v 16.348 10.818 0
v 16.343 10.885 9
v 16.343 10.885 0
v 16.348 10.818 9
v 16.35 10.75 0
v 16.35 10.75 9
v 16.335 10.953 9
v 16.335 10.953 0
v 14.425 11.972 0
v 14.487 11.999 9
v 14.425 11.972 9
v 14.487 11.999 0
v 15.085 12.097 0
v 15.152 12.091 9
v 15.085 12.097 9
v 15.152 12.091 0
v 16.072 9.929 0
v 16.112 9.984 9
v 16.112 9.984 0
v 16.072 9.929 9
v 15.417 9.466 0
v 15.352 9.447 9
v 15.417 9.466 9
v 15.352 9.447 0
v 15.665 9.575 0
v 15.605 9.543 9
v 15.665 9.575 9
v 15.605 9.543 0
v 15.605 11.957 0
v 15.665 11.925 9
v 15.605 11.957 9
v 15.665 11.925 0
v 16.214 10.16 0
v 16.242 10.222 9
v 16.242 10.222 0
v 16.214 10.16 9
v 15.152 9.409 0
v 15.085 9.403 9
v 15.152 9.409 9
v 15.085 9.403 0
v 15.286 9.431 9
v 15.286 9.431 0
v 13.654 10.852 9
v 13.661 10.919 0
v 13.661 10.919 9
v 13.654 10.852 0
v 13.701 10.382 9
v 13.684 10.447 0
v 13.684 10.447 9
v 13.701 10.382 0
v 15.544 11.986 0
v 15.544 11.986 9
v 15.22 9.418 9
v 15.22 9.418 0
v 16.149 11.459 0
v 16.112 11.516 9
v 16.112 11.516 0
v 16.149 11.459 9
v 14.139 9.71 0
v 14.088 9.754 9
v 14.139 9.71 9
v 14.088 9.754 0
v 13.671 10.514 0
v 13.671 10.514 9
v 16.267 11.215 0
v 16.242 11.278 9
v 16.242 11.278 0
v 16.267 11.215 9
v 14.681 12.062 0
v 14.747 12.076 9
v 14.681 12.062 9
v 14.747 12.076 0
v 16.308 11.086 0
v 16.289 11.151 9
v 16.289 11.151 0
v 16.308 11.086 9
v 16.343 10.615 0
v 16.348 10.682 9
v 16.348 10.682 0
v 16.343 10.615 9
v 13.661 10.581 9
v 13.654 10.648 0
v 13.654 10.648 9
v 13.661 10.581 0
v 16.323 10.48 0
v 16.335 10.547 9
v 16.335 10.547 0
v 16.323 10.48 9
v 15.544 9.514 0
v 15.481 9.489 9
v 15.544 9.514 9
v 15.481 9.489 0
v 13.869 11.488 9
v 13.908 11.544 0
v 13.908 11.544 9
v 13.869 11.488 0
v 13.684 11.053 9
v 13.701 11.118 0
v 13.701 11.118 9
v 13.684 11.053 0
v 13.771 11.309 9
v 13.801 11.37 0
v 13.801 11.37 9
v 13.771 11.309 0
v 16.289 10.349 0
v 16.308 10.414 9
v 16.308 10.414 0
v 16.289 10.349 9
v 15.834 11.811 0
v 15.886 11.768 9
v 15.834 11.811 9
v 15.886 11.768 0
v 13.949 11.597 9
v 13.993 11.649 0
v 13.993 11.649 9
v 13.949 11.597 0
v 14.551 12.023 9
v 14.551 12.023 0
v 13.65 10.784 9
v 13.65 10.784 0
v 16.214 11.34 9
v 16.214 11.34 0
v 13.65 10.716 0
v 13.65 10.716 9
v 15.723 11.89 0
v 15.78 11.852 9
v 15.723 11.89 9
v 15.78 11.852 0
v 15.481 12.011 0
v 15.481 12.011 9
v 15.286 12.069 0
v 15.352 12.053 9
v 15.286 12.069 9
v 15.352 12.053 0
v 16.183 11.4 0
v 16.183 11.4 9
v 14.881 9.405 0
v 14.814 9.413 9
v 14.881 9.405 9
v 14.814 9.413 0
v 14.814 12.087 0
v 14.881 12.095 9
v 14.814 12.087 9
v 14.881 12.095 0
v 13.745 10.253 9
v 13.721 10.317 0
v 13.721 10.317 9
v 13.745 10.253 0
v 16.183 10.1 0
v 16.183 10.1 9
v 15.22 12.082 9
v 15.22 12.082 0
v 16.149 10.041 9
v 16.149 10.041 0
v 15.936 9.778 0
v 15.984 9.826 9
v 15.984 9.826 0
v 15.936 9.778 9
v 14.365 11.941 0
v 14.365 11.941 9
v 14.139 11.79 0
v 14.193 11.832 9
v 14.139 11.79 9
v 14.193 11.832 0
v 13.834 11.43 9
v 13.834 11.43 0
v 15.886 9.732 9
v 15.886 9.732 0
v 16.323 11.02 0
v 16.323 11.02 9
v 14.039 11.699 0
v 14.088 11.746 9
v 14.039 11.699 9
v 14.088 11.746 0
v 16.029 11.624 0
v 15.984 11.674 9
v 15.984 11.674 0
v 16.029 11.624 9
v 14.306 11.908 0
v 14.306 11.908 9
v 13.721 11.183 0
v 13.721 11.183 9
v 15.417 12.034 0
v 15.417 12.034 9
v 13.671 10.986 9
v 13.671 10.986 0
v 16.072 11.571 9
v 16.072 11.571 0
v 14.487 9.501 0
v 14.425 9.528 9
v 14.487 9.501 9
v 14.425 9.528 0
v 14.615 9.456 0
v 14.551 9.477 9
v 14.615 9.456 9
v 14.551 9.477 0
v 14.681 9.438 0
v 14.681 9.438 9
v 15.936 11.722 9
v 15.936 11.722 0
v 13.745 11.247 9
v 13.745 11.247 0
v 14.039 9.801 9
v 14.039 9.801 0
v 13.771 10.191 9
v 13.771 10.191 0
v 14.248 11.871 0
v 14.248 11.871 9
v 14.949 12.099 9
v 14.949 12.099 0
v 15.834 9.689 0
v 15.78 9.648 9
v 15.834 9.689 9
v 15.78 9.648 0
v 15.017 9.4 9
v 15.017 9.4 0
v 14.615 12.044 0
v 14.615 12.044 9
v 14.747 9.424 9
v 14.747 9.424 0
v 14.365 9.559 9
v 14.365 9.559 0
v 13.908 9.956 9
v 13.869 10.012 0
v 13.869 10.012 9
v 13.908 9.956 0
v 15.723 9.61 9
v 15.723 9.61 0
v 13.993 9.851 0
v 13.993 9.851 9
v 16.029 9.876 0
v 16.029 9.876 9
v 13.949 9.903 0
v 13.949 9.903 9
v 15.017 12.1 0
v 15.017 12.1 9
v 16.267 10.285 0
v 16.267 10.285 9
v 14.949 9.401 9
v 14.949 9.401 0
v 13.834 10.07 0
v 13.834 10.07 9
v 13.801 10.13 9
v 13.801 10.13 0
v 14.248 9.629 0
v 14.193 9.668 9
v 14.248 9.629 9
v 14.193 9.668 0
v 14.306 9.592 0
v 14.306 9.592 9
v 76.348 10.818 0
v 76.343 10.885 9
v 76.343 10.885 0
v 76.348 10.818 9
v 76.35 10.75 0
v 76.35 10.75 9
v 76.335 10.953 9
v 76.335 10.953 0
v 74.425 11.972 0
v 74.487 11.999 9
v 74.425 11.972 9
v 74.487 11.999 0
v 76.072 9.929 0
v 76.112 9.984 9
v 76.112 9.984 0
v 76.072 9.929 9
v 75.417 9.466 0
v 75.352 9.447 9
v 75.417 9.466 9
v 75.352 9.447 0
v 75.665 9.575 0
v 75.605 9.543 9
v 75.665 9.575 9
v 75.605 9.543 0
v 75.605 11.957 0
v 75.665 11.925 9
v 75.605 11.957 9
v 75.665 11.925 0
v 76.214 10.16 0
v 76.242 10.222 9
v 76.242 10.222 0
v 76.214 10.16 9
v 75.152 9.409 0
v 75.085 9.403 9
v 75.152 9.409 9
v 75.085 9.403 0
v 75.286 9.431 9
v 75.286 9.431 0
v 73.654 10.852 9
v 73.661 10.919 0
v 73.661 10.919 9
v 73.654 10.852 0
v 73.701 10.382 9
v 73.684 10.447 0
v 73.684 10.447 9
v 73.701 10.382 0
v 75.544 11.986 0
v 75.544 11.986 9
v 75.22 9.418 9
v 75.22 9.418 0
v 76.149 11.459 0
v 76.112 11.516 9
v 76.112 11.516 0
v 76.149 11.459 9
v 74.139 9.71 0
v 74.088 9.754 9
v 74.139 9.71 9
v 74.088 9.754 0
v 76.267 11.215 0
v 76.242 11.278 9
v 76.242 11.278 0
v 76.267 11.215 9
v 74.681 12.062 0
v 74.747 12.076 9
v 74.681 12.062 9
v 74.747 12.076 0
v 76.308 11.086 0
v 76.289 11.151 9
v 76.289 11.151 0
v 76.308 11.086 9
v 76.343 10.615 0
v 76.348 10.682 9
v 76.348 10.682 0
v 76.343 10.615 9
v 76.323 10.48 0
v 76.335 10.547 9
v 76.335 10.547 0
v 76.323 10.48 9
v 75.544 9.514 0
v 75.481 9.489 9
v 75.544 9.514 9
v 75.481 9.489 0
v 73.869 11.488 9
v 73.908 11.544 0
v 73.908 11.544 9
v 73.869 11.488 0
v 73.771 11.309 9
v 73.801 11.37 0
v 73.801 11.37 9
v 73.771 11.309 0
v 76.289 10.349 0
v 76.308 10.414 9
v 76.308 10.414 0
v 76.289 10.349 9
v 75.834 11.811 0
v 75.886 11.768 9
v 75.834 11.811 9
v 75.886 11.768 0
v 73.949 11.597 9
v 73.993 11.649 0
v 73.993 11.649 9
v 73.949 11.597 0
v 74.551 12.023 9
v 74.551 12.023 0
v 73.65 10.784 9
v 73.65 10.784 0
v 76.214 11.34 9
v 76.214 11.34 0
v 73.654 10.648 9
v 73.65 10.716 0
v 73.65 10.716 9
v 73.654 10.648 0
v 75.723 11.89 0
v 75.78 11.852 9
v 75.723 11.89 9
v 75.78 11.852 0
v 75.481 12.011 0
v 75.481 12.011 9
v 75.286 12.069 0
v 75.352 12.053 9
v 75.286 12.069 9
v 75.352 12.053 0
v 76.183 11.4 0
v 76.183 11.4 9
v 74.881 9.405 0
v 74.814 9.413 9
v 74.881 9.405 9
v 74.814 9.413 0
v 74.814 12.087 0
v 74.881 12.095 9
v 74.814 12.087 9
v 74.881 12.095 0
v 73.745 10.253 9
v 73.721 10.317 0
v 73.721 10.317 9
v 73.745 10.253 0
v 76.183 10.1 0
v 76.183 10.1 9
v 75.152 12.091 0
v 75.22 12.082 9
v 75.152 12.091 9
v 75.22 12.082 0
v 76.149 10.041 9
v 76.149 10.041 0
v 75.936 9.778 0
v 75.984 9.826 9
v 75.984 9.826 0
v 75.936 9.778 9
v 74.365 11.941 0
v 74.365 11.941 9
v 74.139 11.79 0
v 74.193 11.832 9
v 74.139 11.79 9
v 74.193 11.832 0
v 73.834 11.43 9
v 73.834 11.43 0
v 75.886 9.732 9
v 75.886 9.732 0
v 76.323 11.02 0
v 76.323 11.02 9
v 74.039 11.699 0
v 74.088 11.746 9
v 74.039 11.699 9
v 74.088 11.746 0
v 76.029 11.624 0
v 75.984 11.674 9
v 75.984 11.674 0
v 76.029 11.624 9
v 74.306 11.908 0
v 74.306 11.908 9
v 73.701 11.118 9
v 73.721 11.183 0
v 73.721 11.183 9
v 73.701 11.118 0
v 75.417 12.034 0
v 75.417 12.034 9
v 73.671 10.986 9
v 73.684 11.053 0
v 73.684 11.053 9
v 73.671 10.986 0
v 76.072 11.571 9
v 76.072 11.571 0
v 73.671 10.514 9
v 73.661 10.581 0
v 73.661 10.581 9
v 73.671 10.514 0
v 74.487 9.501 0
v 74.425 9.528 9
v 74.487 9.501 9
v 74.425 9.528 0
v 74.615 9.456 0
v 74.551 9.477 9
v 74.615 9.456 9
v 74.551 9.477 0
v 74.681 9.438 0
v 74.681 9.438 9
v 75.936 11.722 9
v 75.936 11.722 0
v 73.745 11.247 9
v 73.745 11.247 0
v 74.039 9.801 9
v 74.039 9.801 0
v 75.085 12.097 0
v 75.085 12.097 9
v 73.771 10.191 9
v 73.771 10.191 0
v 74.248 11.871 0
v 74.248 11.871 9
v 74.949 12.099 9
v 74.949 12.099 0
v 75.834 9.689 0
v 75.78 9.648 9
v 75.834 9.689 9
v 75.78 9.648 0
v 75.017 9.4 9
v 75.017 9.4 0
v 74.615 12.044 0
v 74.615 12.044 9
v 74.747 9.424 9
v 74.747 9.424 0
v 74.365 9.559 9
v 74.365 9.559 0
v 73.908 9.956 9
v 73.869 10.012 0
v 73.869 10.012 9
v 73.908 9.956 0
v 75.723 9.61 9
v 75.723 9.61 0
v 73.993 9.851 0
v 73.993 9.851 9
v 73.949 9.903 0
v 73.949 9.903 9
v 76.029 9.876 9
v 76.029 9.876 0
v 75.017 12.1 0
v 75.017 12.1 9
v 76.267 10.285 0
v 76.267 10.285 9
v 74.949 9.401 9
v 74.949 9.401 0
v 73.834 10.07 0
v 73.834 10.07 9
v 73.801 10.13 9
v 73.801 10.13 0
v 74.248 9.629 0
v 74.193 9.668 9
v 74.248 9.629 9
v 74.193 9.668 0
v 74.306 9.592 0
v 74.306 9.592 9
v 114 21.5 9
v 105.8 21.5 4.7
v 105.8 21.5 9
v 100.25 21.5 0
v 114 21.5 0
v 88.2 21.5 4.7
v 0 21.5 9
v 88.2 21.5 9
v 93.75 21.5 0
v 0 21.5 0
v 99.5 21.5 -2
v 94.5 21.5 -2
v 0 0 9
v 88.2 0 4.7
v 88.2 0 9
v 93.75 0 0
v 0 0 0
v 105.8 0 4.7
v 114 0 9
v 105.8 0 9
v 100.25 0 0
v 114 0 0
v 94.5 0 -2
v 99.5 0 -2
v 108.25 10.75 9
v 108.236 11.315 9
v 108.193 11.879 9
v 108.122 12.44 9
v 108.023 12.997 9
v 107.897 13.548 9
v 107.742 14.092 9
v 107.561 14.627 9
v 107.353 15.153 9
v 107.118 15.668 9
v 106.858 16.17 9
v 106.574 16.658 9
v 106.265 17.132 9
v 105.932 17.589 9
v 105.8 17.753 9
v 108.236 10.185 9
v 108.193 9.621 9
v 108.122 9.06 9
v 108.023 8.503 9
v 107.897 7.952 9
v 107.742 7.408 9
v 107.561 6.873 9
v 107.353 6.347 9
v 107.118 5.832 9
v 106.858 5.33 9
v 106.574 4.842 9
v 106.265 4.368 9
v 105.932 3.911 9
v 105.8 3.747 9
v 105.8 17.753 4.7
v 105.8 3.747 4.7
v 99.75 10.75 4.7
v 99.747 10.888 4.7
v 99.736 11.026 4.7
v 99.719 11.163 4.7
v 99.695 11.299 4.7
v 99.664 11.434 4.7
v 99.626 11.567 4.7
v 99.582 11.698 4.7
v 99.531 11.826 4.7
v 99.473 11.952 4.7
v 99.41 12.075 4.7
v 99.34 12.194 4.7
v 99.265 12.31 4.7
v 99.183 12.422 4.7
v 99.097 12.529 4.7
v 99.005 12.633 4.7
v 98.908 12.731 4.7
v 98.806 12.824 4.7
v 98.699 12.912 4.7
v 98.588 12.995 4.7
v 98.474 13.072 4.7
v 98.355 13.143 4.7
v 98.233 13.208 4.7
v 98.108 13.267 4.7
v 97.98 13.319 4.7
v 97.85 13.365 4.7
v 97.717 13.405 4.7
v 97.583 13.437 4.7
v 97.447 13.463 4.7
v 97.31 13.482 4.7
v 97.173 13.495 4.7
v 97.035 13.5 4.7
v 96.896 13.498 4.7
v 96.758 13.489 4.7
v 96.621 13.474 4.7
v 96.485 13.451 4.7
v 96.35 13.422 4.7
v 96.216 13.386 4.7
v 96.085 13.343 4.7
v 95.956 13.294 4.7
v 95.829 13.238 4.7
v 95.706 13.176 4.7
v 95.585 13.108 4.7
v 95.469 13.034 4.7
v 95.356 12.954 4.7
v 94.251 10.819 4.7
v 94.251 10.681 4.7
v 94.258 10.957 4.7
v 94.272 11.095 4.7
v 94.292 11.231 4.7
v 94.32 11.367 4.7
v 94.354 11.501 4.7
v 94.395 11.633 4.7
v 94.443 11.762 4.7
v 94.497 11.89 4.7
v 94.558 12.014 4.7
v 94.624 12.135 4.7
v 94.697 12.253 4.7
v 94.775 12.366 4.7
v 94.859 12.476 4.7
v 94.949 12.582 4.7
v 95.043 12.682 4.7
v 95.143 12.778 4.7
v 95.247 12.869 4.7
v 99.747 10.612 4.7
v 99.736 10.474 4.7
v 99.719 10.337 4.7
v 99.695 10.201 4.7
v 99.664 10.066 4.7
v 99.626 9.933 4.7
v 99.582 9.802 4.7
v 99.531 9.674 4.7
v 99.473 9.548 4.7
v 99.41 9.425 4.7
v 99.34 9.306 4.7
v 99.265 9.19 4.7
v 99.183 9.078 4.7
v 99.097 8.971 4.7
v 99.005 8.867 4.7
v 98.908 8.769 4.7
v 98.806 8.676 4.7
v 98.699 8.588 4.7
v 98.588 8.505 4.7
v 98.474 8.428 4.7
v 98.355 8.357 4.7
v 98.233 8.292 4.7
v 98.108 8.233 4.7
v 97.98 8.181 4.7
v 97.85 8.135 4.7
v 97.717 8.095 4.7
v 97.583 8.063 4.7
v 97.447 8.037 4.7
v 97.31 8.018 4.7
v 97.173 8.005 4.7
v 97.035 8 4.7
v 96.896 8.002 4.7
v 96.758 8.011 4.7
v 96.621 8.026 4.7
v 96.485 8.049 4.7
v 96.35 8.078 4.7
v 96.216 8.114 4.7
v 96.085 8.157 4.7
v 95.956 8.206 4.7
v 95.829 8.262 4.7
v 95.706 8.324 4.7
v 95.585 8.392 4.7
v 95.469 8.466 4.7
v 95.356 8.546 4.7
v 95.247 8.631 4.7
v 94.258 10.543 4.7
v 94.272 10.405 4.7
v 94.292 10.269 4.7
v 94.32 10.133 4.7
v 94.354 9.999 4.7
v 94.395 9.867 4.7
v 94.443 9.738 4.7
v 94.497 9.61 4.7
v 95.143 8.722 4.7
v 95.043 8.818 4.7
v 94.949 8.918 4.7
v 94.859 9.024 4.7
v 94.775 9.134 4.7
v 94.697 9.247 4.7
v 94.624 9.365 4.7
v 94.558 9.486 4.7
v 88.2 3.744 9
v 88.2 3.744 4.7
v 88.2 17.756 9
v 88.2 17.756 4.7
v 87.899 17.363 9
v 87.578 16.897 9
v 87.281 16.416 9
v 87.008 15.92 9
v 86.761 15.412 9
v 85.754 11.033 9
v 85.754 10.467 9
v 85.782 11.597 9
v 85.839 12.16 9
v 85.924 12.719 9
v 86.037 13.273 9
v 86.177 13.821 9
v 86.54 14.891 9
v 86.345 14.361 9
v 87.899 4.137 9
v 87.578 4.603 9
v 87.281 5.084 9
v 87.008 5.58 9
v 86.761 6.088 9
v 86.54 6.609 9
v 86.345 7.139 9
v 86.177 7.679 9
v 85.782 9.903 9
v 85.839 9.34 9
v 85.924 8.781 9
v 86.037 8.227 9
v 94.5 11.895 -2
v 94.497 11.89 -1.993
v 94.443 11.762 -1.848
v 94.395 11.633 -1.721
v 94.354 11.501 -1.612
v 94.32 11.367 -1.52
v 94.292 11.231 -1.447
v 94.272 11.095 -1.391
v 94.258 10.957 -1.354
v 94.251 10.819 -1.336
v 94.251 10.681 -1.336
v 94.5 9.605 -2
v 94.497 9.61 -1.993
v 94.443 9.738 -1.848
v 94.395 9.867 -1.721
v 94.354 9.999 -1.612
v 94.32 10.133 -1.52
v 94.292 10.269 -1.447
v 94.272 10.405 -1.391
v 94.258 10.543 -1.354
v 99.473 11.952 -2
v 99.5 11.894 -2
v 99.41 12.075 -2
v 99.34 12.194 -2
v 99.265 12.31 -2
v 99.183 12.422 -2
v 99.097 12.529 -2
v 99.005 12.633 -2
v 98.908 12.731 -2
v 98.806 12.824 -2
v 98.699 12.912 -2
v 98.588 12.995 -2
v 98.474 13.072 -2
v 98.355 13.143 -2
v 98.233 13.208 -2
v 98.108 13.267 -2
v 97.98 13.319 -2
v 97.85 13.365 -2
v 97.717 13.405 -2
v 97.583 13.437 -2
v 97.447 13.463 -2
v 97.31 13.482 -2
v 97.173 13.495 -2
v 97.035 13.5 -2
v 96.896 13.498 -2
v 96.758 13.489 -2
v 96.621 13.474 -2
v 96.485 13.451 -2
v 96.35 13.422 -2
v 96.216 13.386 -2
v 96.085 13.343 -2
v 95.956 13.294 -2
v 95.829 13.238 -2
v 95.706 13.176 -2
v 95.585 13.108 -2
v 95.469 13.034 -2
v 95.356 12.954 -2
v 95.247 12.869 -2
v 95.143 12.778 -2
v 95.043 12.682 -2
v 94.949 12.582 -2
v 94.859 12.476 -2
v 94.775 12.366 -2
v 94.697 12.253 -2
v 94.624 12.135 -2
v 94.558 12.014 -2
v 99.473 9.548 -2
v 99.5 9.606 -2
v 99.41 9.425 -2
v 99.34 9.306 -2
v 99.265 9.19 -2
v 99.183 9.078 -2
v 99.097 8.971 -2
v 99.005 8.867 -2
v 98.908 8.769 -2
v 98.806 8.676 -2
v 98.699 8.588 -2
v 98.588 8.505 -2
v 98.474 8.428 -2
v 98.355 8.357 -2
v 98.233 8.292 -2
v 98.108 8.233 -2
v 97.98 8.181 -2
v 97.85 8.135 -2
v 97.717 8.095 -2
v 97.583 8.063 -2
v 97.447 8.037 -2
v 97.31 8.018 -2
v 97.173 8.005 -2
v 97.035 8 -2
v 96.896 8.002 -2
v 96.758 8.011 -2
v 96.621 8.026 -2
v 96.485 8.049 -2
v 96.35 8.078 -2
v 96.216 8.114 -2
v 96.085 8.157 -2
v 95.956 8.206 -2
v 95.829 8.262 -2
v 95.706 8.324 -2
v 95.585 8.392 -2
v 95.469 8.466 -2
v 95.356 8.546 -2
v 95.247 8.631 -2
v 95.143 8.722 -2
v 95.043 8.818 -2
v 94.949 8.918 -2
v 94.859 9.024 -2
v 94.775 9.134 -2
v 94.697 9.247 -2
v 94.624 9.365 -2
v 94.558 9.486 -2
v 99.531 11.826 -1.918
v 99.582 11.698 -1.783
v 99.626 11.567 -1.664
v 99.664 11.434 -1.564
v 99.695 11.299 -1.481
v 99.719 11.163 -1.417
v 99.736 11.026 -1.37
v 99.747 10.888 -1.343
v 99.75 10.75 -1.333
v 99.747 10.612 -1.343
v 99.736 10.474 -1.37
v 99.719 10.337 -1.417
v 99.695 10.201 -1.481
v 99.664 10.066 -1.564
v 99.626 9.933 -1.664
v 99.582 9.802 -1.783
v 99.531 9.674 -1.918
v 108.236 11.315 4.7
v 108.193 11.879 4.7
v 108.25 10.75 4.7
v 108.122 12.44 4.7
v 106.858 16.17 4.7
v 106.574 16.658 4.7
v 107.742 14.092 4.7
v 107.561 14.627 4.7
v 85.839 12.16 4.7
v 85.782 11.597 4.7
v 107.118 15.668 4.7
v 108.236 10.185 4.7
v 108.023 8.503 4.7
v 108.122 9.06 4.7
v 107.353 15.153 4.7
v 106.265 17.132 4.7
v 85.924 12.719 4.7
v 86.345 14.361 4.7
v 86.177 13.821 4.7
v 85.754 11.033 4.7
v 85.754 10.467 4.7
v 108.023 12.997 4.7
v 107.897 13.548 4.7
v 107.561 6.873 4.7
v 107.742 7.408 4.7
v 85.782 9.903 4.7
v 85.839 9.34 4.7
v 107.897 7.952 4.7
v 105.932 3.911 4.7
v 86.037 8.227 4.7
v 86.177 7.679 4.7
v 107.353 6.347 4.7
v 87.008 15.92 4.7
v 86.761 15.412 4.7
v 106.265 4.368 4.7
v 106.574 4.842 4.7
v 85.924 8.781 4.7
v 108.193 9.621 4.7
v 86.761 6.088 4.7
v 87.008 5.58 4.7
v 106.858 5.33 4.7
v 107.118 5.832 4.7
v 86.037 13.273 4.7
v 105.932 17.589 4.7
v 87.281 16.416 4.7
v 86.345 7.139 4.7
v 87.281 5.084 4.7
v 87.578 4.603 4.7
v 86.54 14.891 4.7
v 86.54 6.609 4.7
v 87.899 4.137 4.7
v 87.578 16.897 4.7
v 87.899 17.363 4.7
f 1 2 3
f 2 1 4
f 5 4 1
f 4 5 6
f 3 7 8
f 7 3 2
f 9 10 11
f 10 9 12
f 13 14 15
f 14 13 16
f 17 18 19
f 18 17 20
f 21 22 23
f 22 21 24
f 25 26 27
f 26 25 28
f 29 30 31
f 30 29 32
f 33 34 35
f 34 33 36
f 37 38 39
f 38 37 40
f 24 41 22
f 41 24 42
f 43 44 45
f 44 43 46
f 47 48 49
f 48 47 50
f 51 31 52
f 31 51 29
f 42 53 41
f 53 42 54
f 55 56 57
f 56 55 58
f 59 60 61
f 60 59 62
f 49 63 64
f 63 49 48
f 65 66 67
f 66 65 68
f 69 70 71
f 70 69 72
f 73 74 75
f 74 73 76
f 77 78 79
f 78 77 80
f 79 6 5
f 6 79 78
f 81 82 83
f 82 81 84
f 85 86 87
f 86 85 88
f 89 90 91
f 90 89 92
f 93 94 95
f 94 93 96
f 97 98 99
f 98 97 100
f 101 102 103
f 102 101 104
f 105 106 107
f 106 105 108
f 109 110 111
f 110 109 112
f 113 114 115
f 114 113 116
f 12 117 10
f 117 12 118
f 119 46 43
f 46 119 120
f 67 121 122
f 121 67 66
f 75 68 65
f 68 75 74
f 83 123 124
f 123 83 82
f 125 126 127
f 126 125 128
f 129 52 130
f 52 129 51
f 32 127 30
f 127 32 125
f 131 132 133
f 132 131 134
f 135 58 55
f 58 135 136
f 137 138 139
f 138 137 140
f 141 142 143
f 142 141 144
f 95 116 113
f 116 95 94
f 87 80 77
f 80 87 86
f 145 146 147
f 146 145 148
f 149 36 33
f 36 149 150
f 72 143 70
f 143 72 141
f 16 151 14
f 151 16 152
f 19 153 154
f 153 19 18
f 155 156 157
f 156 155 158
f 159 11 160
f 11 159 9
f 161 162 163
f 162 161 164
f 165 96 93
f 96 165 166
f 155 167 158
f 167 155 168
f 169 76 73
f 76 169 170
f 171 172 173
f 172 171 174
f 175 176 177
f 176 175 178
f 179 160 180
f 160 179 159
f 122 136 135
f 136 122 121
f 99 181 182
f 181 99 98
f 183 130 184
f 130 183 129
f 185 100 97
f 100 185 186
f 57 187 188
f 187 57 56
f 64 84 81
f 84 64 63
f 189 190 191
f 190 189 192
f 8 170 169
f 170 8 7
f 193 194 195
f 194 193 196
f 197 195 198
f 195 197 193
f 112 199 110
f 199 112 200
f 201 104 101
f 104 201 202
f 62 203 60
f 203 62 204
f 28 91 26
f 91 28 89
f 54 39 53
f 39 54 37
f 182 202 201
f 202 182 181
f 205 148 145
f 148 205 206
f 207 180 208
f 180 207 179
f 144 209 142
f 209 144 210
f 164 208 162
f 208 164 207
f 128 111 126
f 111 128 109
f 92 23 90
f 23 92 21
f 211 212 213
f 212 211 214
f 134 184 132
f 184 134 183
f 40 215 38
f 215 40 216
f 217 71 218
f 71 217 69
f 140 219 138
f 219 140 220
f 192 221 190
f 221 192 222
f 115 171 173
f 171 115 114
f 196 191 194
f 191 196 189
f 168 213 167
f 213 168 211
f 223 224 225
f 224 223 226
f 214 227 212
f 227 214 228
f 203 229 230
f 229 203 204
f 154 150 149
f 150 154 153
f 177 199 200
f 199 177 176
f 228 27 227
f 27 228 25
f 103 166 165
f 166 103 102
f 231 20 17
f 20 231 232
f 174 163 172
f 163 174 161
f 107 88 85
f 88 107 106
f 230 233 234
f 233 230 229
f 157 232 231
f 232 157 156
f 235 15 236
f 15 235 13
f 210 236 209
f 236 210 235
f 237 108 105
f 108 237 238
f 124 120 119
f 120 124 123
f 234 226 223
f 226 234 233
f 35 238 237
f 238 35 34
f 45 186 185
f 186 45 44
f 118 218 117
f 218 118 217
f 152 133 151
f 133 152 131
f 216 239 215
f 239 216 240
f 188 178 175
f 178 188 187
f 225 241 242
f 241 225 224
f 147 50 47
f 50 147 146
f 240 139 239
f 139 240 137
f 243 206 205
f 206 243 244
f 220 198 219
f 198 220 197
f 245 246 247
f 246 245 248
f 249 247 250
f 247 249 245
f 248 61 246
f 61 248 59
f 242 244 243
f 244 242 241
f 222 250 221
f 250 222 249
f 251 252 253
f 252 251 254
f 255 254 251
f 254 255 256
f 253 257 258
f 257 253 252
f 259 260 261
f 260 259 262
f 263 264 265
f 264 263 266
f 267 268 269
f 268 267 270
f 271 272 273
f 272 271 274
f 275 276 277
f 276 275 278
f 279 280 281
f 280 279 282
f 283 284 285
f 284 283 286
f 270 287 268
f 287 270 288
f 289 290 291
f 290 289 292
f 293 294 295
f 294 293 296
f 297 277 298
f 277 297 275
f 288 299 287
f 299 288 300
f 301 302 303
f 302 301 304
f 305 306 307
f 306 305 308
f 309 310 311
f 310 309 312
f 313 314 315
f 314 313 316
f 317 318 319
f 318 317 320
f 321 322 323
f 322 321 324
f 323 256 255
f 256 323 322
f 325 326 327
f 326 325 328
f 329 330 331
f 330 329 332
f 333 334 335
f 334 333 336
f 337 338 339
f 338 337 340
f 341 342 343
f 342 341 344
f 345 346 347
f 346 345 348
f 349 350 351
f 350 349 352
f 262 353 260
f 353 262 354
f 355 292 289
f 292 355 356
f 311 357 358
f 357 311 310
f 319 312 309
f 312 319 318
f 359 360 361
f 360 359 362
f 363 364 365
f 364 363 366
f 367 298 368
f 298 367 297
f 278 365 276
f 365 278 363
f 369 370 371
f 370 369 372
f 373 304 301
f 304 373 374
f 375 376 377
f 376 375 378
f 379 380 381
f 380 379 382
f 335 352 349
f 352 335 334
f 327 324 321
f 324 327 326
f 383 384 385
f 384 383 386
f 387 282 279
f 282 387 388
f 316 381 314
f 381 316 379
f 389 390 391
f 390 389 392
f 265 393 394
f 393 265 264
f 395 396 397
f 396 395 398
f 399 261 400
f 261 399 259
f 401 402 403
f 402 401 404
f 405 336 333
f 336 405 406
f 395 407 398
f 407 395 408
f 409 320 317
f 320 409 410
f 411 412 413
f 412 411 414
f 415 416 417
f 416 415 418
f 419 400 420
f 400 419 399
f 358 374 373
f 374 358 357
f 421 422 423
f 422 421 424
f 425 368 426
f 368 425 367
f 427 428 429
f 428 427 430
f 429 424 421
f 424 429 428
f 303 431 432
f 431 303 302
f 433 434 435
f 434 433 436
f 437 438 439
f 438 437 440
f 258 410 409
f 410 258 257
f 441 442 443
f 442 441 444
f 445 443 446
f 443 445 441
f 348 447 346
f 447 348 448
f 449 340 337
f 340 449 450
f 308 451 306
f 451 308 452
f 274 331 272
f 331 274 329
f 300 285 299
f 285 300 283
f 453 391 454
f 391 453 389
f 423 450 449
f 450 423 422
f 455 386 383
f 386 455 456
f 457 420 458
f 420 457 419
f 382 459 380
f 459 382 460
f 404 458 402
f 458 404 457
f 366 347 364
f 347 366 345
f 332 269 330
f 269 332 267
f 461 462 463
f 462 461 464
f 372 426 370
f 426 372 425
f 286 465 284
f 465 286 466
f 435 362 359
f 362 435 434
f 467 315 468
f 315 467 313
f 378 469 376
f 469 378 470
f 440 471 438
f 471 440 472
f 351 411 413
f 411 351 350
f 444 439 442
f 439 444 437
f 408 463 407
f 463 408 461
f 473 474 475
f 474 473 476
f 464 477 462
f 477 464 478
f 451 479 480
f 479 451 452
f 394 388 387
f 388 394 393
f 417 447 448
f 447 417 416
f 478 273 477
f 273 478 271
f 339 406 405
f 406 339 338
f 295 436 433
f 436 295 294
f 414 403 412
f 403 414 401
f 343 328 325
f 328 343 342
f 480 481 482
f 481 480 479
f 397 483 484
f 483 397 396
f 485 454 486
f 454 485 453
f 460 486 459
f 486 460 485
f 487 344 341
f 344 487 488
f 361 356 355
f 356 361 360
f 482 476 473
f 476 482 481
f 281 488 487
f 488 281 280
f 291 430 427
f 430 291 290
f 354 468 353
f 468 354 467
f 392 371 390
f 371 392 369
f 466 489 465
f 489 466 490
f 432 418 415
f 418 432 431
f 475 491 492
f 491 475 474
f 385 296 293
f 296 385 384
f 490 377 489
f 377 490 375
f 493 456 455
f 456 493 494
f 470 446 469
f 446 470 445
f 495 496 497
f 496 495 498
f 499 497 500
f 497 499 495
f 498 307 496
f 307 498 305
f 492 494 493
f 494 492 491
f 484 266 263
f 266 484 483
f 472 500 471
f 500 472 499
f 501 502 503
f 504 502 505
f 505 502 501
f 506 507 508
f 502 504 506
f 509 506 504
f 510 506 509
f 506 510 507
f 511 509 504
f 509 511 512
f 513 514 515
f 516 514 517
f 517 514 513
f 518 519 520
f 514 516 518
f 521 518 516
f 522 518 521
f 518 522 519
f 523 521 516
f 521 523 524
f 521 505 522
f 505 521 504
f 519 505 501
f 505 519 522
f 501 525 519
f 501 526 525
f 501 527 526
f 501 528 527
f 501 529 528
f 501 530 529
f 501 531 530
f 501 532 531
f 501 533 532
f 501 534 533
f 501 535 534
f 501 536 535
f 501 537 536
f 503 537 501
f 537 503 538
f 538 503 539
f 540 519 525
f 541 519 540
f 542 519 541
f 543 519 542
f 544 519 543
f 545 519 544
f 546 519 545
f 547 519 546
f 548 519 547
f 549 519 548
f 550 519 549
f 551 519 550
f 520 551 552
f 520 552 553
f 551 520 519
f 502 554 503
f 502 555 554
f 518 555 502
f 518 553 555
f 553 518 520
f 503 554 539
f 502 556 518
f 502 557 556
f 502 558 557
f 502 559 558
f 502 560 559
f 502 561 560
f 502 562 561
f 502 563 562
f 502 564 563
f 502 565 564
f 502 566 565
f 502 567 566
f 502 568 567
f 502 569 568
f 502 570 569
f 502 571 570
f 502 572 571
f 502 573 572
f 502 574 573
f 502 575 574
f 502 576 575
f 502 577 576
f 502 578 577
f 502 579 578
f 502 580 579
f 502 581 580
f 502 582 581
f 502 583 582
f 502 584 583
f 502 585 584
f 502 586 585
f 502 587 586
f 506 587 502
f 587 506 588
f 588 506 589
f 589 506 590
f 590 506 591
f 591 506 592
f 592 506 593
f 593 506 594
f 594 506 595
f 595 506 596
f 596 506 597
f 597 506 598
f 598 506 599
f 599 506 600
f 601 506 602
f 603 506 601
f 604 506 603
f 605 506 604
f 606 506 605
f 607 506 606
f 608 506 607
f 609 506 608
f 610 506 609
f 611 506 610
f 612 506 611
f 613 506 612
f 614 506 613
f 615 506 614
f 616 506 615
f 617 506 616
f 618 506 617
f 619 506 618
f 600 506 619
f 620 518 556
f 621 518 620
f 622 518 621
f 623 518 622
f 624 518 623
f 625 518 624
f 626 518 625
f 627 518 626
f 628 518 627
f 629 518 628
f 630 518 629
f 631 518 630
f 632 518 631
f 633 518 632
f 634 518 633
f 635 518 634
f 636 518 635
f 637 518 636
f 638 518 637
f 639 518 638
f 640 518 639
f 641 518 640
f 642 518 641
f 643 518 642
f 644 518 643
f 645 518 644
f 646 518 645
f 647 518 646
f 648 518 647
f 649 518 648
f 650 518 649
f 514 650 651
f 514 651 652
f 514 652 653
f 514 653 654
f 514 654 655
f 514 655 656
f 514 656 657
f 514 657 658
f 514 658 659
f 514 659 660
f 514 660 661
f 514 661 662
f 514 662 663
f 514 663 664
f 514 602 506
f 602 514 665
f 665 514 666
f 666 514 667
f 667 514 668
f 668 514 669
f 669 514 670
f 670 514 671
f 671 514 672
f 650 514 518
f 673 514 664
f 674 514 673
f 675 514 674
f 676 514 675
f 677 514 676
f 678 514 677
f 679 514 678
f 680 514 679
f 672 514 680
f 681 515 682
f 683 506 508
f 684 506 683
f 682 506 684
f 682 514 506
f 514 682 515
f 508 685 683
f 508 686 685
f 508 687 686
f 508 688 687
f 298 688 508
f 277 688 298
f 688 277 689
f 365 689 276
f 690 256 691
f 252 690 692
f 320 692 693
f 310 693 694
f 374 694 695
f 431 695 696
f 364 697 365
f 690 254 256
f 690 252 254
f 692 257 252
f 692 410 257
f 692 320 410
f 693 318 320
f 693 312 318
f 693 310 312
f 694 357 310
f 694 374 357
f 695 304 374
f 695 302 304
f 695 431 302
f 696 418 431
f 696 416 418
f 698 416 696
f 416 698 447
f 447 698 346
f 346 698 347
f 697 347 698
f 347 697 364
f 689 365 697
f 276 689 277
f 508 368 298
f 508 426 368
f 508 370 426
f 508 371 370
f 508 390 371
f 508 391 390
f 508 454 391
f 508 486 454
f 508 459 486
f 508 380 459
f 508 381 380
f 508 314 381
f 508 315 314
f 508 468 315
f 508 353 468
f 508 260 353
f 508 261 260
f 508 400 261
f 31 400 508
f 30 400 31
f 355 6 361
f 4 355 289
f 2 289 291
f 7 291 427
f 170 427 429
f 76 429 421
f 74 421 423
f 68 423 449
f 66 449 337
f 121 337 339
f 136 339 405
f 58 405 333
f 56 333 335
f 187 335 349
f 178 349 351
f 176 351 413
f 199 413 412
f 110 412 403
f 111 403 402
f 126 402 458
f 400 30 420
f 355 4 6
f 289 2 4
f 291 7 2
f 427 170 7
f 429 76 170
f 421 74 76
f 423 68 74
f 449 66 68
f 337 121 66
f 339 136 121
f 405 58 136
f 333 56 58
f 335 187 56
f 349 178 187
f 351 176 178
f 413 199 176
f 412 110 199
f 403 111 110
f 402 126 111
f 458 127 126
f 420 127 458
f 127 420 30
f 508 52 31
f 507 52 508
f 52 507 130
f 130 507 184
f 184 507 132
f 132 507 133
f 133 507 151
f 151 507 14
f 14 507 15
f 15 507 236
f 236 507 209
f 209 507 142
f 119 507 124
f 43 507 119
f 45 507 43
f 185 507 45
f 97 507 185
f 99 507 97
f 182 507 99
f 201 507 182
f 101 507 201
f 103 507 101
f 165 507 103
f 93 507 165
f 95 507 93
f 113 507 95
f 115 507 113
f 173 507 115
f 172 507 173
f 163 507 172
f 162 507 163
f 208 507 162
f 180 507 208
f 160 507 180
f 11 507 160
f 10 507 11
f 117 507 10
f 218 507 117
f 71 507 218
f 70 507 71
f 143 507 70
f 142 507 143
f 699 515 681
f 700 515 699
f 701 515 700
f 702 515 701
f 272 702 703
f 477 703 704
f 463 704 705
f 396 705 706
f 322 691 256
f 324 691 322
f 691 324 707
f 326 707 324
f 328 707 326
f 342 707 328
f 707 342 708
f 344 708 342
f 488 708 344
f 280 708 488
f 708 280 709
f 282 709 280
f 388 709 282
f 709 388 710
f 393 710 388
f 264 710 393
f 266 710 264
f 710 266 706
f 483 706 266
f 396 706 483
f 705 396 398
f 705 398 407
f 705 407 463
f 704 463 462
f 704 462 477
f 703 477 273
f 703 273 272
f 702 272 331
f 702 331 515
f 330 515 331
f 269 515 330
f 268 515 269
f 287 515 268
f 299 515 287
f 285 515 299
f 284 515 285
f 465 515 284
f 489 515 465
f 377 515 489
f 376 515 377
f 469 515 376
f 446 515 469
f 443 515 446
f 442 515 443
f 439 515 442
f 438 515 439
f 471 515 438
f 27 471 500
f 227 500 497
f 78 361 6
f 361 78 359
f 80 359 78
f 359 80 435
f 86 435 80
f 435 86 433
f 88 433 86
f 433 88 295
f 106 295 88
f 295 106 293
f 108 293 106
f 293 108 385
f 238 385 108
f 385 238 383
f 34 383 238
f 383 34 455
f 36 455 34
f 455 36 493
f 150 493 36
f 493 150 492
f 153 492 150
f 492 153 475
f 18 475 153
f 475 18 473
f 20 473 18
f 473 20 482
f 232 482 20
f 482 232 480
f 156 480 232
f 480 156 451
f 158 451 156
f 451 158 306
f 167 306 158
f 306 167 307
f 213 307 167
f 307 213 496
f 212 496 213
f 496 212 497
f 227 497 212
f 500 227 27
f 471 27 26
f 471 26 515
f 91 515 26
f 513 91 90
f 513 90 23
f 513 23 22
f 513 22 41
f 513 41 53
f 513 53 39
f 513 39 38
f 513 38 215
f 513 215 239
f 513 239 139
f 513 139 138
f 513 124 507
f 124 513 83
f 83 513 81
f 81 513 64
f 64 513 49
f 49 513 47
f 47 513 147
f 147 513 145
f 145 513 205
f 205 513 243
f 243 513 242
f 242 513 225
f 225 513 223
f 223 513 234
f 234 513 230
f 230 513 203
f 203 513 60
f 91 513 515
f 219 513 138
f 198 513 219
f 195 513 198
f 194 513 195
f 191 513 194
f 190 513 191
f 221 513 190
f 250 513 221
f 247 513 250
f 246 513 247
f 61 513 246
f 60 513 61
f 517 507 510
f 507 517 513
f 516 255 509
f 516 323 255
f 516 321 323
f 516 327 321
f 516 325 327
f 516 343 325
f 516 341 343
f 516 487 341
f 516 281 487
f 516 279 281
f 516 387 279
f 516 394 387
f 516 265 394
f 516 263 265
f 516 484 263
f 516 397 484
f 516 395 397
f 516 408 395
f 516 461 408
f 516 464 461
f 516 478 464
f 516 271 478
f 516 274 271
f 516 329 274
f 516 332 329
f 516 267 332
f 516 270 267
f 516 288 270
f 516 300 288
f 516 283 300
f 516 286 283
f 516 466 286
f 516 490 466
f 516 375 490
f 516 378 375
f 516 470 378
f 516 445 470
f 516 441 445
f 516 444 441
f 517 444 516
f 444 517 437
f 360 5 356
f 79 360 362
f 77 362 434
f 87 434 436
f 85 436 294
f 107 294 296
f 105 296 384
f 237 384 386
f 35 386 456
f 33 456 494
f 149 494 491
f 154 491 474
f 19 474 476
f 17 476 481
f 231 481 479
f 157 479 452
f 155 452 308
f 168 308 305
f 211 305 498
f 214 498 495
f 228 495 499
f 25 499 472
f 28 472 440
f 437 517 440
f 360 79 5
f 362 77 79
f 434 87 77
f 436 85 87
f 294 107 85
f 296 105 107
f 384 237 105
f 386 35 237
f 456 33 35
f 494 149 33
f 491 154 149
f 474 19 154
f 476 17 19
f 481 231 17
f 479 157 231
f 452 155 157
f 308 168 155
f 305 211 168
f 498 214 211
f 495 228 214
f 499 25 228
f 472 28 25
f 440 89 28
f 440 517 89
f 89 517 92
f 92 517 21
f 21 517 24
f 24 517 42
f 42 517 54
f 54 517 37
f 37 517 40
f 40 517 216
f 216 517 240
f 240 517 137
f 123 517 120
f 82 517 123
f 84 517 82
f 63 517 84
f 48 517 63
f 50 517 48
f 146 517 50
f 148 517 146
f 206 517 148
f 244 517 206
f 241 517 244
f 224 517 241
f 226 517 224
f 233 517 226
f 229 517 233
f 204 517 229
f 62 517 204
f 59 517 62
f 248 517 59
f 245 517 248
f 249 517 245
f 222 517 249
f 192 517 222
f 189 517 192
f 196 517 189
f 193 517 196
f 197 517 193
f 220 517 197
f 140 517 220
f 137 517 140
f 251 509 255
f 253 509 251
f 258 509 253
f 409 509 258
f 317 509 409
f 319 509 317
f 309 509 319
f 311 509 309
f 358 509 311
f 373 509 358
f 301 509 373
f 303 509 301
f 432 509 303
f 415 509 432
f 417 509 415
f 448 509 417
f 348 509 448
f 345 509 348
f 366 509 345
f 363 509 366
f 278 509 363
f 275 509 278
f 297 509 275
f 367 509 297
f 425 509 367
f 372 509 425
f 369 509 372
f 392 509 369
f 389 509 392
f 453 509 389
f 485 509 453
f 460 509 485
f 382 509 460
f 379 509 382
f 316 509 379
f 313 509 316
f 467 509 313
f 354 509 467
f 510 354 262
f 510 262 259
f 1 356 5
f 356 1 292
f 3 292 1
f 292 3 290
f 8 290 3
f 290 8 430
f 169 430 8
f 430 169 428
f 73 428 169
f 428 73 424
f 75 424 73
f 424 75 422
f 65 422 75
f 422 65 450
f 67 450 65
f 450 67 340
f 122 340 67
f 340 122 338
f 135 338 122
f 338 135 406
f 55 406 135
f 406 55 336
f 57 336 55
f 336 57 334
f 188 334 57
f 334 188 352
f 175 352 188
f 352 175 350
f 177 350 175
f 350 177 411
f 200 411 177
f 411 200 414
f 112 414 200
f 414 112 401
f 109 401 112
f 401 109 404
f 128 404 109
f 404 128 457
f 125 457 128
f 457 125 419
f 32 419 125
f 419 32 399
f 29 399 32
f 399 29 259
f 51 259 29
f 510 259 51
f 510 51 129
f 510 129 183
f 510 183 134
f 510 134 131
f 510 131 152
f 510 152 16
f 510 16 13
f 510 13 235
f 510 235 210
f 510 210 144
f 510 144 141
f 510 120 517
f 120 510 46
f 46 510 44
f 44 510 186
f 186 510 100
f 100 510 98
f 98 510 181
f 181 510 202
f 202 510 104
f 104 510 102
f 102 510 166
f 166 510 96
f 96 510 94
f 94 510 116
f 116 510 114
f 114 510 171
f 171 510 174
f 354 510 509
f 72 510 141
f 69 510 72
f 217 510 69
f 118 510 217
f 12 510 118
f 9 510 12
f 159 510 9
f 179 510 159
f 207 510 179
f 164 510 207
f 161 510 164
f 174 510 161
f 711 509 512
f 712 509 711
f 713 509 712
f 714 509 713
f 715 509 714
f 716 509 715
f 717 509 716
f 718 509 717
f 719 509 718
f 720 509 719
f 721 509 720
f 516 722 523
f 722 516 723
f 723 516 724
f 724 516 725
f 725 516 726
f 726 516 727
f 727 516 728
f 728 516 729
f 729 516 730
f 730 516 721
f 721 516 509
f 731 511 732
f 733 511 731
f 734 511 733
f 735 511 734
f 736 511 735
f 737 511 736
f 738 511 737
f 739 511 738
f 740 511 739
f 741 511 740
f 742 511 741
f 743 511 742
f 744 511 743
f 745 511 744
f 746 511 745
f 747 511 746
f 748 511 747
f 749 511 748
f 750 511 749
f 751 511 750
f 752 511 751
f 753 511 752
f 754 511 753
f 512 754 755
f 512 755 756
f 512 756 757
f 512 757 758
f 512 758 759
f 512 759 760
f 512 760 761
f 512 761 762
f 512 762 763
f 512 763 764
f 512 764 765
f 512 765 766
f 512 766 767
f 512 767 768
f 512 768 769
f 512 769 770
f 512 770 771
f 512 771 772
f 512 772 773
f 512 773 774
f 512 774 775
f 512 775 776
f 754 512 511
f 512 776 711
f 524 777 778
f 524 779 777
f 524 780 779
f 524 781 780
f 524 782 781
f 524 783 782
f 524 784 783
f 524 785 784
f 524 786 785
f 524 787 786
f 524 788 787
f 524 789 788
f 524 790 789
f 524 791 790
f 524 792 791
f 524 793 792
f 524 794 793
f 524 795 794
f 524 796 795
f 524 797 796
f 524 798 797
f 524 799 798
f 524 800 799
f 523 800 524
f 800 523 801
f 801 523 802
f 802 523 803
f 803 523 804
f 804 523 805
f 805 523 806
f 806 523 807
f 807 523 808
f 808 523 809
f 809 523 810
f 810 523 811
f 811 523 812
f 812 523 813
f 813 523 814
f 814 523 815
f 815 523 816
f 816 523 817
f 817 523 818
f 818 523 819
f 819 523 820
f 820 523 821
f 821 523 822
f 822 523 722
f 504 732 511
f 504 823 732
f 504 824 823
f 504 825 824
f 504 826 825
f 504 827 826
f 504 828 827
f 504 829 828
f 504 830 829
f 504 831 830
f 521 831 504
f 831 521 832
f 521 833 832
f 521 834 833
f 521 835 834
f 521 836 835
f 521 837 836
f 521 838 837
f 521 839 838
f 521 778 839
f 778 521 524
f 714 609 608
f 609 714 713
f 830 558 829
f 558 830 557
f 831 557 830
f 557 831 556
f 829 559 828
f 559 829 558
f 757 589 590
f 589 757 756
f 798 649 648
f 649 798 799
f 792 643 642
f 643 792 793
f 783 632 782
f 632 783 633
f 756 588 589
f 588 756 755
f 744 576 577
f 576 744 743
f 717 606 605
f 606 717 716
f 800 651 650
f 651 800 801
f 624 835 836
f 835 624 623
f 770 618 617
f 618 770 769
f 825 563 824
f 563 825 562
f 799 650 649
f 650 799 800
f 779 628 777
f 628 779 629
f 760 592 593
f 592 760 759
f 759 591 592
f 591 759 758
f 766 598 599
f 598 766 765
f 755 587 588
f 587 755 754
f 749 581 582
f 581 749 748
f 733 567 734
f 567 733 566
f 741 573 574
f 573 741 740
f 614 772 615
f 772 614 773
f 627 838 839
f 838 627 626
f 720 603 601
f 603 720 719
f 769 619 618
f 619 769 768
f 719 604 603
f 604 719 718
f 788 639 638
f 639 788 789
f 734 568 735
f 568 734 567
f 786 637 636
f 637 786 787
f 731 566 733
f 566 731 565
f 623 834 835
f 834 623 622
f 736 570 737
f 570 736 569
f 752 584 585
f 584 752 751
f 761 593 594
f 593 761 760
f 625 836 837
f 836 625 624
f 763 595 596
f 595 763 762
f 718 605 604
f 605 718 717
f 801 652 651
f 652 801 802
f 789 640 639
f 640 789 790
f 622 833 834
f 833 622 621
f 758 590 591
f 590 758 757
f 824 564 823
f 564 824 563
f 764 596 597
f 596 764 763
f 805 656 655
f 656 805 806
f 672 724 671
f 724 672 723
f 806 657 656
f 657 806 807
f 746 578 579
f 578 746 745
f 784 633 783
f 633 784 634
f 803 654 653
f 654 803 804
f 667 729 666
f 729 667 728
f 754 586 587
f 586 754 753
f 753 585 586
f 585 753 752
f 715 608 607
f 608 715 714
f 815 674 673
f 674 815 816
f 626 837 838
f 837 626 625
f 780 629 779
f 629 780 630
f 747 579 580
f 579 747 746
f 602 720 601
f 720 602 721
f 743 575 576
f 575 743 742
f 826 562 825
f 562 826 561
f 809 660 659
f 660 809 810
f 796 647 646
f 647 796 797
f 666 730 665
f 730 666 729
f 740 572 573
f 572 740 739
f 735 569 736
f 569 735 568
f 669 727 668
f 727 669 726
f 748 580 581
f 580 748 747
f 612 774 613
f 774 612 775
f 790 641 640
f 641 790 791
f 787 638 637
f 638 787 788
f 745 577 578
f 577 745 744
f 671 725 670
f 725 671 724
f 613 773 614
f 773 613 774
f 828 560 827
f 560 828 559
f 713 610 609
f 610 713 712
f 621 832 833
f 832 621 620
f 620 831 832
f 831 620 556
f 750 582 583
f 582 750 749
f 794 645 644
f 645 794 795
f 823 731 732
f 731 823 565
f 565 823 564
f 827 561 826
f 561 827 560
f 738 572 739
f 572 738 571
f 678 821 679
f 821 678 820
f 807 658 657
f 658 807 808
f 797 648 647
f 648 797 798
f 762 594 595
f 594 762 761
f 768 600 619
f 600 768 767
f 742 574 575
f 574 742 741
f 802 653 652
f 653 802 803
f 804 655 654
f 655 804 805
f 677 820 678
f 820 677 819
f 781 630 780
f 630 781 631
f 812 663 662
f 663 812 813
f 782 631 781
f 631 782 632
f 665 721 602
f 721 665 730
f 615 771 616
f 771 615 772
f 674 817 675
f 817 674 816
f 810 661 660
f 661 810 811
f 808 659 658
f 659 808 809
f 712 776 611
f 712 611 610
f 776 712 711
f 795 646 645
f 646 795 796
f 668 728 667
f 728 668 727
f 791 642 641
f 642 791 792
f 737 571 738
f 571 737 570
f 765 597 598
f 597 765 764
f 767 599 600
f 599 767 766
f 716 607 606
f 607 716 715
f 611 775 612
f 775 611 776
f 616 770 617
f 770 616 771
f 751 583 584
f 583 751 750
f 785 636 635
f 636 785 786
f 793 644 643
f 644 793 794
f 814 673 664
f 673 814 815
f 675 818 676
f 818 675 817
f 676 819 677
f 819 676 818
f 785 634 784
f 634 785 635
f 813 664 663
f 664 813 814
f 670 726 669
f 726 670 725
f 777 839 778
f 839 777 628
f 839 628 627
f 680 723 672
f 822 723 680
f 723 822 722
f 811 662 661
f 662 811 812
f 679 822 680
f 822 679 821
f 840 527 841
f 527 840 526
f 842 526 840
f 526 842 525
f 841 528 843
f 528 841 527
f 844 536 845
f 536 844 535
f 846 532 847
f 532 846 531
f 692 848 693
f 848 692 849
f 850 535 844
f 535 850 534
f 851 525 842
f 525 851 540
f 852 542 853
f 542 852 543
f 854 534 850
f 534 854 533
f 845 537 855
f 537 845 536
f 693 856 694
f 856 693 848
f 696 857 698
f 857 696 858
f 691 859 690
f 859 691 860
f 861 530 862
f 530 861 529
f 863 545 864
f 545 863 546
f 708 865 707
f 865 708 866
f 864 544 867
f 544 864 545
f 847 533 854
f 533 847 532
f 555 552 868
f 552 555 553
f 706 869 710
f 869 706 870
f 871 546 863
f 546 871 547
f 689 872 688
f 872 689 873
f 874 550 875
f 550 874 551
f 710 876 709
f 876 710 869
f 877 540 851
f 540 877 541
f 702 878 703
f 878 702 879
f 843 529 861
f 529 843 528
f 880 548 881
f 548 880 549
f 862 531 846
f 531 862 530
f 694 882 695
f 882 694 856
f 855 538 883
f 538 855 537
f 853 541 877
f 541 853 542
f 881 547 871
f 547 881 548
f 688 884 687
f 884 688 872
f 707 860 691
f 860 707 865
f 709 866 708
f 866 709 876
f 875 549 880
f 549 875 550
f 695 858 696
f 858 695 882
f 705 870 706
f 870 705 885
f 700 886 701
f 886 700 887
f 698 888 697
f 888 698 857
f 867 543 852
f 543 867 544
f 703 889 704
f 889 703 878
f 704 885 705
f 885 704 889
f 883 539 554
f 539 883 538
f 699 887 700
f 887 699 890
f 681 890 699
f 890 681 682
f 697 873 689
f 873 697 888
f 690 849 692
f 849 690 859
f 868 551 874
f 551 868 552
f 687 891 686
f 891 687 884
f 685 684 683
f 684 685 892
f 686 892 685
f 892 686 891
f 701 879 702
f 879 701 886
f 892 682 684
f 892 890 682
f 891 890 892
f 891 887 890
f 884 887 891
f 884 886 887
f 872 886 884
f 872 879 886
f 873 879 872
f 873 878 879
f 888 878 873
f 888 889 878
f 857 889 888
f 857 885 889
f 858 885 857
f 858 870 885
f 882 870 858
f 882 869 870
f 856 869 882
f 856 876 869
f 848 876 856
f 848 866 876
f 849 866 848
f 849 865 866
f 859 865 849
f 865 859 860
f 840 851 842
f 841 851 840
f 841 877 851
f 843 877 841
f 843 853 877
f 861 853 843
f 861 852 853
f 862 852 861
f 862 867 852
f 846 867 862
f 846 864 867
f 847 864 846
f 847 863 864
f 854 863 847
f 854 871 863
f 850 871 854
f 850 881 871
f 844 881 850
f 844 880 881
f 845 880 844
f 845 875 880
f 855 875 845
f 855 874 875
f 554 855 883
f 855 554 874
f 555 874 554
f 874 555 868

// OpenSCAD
// created by AkytharPandaaa
// encoding: utf-8

$fn = $preview? 25:125;

module mb200_rightangle() {
  difference() {
    translate(v = [0, 21.5, 0]) rotate(a = 90, v = [1, 0, 0]) linear_extrude(height = 21.5, center = false, convexity = 10, twist = 0, slices = 20, scale = 1.0) {
      difference() {
        union() {
          square(size = [114, 9], center = false);
          translate(v = [88.2+(17.6-6.5)/2, 0, 0]) polygon(points = [
            [0,0],
            [6.5,0],
            [6.5-(6.5-5)/2, -2],
            [(6.5-5)/2, -2]
          ]);
        }
      translate(v = [88.2, 9-4.3, 0]) square(size = [17.6, 4.3], center = false);
      }
    }
    translate(v = [88.2+(17.6)/2, 21.5/2, -2.5]) cylinder(h = 15, d = 5.5, center = false);
    translate(v = [88.2+(17.6)/2, 21.5/2, 9-4.3]) cylinder(h = 9-4.3, d = 22.5, center = false);

    // M3 mounting holes for accessories
    for (i=[0:1]) {
      translate(v = [15 + 60*i, 21.5/2, -.1]) cylinder(h = 9.2, d = 2.7, center = false);
    }
  }
}

mb200_rightangle();
